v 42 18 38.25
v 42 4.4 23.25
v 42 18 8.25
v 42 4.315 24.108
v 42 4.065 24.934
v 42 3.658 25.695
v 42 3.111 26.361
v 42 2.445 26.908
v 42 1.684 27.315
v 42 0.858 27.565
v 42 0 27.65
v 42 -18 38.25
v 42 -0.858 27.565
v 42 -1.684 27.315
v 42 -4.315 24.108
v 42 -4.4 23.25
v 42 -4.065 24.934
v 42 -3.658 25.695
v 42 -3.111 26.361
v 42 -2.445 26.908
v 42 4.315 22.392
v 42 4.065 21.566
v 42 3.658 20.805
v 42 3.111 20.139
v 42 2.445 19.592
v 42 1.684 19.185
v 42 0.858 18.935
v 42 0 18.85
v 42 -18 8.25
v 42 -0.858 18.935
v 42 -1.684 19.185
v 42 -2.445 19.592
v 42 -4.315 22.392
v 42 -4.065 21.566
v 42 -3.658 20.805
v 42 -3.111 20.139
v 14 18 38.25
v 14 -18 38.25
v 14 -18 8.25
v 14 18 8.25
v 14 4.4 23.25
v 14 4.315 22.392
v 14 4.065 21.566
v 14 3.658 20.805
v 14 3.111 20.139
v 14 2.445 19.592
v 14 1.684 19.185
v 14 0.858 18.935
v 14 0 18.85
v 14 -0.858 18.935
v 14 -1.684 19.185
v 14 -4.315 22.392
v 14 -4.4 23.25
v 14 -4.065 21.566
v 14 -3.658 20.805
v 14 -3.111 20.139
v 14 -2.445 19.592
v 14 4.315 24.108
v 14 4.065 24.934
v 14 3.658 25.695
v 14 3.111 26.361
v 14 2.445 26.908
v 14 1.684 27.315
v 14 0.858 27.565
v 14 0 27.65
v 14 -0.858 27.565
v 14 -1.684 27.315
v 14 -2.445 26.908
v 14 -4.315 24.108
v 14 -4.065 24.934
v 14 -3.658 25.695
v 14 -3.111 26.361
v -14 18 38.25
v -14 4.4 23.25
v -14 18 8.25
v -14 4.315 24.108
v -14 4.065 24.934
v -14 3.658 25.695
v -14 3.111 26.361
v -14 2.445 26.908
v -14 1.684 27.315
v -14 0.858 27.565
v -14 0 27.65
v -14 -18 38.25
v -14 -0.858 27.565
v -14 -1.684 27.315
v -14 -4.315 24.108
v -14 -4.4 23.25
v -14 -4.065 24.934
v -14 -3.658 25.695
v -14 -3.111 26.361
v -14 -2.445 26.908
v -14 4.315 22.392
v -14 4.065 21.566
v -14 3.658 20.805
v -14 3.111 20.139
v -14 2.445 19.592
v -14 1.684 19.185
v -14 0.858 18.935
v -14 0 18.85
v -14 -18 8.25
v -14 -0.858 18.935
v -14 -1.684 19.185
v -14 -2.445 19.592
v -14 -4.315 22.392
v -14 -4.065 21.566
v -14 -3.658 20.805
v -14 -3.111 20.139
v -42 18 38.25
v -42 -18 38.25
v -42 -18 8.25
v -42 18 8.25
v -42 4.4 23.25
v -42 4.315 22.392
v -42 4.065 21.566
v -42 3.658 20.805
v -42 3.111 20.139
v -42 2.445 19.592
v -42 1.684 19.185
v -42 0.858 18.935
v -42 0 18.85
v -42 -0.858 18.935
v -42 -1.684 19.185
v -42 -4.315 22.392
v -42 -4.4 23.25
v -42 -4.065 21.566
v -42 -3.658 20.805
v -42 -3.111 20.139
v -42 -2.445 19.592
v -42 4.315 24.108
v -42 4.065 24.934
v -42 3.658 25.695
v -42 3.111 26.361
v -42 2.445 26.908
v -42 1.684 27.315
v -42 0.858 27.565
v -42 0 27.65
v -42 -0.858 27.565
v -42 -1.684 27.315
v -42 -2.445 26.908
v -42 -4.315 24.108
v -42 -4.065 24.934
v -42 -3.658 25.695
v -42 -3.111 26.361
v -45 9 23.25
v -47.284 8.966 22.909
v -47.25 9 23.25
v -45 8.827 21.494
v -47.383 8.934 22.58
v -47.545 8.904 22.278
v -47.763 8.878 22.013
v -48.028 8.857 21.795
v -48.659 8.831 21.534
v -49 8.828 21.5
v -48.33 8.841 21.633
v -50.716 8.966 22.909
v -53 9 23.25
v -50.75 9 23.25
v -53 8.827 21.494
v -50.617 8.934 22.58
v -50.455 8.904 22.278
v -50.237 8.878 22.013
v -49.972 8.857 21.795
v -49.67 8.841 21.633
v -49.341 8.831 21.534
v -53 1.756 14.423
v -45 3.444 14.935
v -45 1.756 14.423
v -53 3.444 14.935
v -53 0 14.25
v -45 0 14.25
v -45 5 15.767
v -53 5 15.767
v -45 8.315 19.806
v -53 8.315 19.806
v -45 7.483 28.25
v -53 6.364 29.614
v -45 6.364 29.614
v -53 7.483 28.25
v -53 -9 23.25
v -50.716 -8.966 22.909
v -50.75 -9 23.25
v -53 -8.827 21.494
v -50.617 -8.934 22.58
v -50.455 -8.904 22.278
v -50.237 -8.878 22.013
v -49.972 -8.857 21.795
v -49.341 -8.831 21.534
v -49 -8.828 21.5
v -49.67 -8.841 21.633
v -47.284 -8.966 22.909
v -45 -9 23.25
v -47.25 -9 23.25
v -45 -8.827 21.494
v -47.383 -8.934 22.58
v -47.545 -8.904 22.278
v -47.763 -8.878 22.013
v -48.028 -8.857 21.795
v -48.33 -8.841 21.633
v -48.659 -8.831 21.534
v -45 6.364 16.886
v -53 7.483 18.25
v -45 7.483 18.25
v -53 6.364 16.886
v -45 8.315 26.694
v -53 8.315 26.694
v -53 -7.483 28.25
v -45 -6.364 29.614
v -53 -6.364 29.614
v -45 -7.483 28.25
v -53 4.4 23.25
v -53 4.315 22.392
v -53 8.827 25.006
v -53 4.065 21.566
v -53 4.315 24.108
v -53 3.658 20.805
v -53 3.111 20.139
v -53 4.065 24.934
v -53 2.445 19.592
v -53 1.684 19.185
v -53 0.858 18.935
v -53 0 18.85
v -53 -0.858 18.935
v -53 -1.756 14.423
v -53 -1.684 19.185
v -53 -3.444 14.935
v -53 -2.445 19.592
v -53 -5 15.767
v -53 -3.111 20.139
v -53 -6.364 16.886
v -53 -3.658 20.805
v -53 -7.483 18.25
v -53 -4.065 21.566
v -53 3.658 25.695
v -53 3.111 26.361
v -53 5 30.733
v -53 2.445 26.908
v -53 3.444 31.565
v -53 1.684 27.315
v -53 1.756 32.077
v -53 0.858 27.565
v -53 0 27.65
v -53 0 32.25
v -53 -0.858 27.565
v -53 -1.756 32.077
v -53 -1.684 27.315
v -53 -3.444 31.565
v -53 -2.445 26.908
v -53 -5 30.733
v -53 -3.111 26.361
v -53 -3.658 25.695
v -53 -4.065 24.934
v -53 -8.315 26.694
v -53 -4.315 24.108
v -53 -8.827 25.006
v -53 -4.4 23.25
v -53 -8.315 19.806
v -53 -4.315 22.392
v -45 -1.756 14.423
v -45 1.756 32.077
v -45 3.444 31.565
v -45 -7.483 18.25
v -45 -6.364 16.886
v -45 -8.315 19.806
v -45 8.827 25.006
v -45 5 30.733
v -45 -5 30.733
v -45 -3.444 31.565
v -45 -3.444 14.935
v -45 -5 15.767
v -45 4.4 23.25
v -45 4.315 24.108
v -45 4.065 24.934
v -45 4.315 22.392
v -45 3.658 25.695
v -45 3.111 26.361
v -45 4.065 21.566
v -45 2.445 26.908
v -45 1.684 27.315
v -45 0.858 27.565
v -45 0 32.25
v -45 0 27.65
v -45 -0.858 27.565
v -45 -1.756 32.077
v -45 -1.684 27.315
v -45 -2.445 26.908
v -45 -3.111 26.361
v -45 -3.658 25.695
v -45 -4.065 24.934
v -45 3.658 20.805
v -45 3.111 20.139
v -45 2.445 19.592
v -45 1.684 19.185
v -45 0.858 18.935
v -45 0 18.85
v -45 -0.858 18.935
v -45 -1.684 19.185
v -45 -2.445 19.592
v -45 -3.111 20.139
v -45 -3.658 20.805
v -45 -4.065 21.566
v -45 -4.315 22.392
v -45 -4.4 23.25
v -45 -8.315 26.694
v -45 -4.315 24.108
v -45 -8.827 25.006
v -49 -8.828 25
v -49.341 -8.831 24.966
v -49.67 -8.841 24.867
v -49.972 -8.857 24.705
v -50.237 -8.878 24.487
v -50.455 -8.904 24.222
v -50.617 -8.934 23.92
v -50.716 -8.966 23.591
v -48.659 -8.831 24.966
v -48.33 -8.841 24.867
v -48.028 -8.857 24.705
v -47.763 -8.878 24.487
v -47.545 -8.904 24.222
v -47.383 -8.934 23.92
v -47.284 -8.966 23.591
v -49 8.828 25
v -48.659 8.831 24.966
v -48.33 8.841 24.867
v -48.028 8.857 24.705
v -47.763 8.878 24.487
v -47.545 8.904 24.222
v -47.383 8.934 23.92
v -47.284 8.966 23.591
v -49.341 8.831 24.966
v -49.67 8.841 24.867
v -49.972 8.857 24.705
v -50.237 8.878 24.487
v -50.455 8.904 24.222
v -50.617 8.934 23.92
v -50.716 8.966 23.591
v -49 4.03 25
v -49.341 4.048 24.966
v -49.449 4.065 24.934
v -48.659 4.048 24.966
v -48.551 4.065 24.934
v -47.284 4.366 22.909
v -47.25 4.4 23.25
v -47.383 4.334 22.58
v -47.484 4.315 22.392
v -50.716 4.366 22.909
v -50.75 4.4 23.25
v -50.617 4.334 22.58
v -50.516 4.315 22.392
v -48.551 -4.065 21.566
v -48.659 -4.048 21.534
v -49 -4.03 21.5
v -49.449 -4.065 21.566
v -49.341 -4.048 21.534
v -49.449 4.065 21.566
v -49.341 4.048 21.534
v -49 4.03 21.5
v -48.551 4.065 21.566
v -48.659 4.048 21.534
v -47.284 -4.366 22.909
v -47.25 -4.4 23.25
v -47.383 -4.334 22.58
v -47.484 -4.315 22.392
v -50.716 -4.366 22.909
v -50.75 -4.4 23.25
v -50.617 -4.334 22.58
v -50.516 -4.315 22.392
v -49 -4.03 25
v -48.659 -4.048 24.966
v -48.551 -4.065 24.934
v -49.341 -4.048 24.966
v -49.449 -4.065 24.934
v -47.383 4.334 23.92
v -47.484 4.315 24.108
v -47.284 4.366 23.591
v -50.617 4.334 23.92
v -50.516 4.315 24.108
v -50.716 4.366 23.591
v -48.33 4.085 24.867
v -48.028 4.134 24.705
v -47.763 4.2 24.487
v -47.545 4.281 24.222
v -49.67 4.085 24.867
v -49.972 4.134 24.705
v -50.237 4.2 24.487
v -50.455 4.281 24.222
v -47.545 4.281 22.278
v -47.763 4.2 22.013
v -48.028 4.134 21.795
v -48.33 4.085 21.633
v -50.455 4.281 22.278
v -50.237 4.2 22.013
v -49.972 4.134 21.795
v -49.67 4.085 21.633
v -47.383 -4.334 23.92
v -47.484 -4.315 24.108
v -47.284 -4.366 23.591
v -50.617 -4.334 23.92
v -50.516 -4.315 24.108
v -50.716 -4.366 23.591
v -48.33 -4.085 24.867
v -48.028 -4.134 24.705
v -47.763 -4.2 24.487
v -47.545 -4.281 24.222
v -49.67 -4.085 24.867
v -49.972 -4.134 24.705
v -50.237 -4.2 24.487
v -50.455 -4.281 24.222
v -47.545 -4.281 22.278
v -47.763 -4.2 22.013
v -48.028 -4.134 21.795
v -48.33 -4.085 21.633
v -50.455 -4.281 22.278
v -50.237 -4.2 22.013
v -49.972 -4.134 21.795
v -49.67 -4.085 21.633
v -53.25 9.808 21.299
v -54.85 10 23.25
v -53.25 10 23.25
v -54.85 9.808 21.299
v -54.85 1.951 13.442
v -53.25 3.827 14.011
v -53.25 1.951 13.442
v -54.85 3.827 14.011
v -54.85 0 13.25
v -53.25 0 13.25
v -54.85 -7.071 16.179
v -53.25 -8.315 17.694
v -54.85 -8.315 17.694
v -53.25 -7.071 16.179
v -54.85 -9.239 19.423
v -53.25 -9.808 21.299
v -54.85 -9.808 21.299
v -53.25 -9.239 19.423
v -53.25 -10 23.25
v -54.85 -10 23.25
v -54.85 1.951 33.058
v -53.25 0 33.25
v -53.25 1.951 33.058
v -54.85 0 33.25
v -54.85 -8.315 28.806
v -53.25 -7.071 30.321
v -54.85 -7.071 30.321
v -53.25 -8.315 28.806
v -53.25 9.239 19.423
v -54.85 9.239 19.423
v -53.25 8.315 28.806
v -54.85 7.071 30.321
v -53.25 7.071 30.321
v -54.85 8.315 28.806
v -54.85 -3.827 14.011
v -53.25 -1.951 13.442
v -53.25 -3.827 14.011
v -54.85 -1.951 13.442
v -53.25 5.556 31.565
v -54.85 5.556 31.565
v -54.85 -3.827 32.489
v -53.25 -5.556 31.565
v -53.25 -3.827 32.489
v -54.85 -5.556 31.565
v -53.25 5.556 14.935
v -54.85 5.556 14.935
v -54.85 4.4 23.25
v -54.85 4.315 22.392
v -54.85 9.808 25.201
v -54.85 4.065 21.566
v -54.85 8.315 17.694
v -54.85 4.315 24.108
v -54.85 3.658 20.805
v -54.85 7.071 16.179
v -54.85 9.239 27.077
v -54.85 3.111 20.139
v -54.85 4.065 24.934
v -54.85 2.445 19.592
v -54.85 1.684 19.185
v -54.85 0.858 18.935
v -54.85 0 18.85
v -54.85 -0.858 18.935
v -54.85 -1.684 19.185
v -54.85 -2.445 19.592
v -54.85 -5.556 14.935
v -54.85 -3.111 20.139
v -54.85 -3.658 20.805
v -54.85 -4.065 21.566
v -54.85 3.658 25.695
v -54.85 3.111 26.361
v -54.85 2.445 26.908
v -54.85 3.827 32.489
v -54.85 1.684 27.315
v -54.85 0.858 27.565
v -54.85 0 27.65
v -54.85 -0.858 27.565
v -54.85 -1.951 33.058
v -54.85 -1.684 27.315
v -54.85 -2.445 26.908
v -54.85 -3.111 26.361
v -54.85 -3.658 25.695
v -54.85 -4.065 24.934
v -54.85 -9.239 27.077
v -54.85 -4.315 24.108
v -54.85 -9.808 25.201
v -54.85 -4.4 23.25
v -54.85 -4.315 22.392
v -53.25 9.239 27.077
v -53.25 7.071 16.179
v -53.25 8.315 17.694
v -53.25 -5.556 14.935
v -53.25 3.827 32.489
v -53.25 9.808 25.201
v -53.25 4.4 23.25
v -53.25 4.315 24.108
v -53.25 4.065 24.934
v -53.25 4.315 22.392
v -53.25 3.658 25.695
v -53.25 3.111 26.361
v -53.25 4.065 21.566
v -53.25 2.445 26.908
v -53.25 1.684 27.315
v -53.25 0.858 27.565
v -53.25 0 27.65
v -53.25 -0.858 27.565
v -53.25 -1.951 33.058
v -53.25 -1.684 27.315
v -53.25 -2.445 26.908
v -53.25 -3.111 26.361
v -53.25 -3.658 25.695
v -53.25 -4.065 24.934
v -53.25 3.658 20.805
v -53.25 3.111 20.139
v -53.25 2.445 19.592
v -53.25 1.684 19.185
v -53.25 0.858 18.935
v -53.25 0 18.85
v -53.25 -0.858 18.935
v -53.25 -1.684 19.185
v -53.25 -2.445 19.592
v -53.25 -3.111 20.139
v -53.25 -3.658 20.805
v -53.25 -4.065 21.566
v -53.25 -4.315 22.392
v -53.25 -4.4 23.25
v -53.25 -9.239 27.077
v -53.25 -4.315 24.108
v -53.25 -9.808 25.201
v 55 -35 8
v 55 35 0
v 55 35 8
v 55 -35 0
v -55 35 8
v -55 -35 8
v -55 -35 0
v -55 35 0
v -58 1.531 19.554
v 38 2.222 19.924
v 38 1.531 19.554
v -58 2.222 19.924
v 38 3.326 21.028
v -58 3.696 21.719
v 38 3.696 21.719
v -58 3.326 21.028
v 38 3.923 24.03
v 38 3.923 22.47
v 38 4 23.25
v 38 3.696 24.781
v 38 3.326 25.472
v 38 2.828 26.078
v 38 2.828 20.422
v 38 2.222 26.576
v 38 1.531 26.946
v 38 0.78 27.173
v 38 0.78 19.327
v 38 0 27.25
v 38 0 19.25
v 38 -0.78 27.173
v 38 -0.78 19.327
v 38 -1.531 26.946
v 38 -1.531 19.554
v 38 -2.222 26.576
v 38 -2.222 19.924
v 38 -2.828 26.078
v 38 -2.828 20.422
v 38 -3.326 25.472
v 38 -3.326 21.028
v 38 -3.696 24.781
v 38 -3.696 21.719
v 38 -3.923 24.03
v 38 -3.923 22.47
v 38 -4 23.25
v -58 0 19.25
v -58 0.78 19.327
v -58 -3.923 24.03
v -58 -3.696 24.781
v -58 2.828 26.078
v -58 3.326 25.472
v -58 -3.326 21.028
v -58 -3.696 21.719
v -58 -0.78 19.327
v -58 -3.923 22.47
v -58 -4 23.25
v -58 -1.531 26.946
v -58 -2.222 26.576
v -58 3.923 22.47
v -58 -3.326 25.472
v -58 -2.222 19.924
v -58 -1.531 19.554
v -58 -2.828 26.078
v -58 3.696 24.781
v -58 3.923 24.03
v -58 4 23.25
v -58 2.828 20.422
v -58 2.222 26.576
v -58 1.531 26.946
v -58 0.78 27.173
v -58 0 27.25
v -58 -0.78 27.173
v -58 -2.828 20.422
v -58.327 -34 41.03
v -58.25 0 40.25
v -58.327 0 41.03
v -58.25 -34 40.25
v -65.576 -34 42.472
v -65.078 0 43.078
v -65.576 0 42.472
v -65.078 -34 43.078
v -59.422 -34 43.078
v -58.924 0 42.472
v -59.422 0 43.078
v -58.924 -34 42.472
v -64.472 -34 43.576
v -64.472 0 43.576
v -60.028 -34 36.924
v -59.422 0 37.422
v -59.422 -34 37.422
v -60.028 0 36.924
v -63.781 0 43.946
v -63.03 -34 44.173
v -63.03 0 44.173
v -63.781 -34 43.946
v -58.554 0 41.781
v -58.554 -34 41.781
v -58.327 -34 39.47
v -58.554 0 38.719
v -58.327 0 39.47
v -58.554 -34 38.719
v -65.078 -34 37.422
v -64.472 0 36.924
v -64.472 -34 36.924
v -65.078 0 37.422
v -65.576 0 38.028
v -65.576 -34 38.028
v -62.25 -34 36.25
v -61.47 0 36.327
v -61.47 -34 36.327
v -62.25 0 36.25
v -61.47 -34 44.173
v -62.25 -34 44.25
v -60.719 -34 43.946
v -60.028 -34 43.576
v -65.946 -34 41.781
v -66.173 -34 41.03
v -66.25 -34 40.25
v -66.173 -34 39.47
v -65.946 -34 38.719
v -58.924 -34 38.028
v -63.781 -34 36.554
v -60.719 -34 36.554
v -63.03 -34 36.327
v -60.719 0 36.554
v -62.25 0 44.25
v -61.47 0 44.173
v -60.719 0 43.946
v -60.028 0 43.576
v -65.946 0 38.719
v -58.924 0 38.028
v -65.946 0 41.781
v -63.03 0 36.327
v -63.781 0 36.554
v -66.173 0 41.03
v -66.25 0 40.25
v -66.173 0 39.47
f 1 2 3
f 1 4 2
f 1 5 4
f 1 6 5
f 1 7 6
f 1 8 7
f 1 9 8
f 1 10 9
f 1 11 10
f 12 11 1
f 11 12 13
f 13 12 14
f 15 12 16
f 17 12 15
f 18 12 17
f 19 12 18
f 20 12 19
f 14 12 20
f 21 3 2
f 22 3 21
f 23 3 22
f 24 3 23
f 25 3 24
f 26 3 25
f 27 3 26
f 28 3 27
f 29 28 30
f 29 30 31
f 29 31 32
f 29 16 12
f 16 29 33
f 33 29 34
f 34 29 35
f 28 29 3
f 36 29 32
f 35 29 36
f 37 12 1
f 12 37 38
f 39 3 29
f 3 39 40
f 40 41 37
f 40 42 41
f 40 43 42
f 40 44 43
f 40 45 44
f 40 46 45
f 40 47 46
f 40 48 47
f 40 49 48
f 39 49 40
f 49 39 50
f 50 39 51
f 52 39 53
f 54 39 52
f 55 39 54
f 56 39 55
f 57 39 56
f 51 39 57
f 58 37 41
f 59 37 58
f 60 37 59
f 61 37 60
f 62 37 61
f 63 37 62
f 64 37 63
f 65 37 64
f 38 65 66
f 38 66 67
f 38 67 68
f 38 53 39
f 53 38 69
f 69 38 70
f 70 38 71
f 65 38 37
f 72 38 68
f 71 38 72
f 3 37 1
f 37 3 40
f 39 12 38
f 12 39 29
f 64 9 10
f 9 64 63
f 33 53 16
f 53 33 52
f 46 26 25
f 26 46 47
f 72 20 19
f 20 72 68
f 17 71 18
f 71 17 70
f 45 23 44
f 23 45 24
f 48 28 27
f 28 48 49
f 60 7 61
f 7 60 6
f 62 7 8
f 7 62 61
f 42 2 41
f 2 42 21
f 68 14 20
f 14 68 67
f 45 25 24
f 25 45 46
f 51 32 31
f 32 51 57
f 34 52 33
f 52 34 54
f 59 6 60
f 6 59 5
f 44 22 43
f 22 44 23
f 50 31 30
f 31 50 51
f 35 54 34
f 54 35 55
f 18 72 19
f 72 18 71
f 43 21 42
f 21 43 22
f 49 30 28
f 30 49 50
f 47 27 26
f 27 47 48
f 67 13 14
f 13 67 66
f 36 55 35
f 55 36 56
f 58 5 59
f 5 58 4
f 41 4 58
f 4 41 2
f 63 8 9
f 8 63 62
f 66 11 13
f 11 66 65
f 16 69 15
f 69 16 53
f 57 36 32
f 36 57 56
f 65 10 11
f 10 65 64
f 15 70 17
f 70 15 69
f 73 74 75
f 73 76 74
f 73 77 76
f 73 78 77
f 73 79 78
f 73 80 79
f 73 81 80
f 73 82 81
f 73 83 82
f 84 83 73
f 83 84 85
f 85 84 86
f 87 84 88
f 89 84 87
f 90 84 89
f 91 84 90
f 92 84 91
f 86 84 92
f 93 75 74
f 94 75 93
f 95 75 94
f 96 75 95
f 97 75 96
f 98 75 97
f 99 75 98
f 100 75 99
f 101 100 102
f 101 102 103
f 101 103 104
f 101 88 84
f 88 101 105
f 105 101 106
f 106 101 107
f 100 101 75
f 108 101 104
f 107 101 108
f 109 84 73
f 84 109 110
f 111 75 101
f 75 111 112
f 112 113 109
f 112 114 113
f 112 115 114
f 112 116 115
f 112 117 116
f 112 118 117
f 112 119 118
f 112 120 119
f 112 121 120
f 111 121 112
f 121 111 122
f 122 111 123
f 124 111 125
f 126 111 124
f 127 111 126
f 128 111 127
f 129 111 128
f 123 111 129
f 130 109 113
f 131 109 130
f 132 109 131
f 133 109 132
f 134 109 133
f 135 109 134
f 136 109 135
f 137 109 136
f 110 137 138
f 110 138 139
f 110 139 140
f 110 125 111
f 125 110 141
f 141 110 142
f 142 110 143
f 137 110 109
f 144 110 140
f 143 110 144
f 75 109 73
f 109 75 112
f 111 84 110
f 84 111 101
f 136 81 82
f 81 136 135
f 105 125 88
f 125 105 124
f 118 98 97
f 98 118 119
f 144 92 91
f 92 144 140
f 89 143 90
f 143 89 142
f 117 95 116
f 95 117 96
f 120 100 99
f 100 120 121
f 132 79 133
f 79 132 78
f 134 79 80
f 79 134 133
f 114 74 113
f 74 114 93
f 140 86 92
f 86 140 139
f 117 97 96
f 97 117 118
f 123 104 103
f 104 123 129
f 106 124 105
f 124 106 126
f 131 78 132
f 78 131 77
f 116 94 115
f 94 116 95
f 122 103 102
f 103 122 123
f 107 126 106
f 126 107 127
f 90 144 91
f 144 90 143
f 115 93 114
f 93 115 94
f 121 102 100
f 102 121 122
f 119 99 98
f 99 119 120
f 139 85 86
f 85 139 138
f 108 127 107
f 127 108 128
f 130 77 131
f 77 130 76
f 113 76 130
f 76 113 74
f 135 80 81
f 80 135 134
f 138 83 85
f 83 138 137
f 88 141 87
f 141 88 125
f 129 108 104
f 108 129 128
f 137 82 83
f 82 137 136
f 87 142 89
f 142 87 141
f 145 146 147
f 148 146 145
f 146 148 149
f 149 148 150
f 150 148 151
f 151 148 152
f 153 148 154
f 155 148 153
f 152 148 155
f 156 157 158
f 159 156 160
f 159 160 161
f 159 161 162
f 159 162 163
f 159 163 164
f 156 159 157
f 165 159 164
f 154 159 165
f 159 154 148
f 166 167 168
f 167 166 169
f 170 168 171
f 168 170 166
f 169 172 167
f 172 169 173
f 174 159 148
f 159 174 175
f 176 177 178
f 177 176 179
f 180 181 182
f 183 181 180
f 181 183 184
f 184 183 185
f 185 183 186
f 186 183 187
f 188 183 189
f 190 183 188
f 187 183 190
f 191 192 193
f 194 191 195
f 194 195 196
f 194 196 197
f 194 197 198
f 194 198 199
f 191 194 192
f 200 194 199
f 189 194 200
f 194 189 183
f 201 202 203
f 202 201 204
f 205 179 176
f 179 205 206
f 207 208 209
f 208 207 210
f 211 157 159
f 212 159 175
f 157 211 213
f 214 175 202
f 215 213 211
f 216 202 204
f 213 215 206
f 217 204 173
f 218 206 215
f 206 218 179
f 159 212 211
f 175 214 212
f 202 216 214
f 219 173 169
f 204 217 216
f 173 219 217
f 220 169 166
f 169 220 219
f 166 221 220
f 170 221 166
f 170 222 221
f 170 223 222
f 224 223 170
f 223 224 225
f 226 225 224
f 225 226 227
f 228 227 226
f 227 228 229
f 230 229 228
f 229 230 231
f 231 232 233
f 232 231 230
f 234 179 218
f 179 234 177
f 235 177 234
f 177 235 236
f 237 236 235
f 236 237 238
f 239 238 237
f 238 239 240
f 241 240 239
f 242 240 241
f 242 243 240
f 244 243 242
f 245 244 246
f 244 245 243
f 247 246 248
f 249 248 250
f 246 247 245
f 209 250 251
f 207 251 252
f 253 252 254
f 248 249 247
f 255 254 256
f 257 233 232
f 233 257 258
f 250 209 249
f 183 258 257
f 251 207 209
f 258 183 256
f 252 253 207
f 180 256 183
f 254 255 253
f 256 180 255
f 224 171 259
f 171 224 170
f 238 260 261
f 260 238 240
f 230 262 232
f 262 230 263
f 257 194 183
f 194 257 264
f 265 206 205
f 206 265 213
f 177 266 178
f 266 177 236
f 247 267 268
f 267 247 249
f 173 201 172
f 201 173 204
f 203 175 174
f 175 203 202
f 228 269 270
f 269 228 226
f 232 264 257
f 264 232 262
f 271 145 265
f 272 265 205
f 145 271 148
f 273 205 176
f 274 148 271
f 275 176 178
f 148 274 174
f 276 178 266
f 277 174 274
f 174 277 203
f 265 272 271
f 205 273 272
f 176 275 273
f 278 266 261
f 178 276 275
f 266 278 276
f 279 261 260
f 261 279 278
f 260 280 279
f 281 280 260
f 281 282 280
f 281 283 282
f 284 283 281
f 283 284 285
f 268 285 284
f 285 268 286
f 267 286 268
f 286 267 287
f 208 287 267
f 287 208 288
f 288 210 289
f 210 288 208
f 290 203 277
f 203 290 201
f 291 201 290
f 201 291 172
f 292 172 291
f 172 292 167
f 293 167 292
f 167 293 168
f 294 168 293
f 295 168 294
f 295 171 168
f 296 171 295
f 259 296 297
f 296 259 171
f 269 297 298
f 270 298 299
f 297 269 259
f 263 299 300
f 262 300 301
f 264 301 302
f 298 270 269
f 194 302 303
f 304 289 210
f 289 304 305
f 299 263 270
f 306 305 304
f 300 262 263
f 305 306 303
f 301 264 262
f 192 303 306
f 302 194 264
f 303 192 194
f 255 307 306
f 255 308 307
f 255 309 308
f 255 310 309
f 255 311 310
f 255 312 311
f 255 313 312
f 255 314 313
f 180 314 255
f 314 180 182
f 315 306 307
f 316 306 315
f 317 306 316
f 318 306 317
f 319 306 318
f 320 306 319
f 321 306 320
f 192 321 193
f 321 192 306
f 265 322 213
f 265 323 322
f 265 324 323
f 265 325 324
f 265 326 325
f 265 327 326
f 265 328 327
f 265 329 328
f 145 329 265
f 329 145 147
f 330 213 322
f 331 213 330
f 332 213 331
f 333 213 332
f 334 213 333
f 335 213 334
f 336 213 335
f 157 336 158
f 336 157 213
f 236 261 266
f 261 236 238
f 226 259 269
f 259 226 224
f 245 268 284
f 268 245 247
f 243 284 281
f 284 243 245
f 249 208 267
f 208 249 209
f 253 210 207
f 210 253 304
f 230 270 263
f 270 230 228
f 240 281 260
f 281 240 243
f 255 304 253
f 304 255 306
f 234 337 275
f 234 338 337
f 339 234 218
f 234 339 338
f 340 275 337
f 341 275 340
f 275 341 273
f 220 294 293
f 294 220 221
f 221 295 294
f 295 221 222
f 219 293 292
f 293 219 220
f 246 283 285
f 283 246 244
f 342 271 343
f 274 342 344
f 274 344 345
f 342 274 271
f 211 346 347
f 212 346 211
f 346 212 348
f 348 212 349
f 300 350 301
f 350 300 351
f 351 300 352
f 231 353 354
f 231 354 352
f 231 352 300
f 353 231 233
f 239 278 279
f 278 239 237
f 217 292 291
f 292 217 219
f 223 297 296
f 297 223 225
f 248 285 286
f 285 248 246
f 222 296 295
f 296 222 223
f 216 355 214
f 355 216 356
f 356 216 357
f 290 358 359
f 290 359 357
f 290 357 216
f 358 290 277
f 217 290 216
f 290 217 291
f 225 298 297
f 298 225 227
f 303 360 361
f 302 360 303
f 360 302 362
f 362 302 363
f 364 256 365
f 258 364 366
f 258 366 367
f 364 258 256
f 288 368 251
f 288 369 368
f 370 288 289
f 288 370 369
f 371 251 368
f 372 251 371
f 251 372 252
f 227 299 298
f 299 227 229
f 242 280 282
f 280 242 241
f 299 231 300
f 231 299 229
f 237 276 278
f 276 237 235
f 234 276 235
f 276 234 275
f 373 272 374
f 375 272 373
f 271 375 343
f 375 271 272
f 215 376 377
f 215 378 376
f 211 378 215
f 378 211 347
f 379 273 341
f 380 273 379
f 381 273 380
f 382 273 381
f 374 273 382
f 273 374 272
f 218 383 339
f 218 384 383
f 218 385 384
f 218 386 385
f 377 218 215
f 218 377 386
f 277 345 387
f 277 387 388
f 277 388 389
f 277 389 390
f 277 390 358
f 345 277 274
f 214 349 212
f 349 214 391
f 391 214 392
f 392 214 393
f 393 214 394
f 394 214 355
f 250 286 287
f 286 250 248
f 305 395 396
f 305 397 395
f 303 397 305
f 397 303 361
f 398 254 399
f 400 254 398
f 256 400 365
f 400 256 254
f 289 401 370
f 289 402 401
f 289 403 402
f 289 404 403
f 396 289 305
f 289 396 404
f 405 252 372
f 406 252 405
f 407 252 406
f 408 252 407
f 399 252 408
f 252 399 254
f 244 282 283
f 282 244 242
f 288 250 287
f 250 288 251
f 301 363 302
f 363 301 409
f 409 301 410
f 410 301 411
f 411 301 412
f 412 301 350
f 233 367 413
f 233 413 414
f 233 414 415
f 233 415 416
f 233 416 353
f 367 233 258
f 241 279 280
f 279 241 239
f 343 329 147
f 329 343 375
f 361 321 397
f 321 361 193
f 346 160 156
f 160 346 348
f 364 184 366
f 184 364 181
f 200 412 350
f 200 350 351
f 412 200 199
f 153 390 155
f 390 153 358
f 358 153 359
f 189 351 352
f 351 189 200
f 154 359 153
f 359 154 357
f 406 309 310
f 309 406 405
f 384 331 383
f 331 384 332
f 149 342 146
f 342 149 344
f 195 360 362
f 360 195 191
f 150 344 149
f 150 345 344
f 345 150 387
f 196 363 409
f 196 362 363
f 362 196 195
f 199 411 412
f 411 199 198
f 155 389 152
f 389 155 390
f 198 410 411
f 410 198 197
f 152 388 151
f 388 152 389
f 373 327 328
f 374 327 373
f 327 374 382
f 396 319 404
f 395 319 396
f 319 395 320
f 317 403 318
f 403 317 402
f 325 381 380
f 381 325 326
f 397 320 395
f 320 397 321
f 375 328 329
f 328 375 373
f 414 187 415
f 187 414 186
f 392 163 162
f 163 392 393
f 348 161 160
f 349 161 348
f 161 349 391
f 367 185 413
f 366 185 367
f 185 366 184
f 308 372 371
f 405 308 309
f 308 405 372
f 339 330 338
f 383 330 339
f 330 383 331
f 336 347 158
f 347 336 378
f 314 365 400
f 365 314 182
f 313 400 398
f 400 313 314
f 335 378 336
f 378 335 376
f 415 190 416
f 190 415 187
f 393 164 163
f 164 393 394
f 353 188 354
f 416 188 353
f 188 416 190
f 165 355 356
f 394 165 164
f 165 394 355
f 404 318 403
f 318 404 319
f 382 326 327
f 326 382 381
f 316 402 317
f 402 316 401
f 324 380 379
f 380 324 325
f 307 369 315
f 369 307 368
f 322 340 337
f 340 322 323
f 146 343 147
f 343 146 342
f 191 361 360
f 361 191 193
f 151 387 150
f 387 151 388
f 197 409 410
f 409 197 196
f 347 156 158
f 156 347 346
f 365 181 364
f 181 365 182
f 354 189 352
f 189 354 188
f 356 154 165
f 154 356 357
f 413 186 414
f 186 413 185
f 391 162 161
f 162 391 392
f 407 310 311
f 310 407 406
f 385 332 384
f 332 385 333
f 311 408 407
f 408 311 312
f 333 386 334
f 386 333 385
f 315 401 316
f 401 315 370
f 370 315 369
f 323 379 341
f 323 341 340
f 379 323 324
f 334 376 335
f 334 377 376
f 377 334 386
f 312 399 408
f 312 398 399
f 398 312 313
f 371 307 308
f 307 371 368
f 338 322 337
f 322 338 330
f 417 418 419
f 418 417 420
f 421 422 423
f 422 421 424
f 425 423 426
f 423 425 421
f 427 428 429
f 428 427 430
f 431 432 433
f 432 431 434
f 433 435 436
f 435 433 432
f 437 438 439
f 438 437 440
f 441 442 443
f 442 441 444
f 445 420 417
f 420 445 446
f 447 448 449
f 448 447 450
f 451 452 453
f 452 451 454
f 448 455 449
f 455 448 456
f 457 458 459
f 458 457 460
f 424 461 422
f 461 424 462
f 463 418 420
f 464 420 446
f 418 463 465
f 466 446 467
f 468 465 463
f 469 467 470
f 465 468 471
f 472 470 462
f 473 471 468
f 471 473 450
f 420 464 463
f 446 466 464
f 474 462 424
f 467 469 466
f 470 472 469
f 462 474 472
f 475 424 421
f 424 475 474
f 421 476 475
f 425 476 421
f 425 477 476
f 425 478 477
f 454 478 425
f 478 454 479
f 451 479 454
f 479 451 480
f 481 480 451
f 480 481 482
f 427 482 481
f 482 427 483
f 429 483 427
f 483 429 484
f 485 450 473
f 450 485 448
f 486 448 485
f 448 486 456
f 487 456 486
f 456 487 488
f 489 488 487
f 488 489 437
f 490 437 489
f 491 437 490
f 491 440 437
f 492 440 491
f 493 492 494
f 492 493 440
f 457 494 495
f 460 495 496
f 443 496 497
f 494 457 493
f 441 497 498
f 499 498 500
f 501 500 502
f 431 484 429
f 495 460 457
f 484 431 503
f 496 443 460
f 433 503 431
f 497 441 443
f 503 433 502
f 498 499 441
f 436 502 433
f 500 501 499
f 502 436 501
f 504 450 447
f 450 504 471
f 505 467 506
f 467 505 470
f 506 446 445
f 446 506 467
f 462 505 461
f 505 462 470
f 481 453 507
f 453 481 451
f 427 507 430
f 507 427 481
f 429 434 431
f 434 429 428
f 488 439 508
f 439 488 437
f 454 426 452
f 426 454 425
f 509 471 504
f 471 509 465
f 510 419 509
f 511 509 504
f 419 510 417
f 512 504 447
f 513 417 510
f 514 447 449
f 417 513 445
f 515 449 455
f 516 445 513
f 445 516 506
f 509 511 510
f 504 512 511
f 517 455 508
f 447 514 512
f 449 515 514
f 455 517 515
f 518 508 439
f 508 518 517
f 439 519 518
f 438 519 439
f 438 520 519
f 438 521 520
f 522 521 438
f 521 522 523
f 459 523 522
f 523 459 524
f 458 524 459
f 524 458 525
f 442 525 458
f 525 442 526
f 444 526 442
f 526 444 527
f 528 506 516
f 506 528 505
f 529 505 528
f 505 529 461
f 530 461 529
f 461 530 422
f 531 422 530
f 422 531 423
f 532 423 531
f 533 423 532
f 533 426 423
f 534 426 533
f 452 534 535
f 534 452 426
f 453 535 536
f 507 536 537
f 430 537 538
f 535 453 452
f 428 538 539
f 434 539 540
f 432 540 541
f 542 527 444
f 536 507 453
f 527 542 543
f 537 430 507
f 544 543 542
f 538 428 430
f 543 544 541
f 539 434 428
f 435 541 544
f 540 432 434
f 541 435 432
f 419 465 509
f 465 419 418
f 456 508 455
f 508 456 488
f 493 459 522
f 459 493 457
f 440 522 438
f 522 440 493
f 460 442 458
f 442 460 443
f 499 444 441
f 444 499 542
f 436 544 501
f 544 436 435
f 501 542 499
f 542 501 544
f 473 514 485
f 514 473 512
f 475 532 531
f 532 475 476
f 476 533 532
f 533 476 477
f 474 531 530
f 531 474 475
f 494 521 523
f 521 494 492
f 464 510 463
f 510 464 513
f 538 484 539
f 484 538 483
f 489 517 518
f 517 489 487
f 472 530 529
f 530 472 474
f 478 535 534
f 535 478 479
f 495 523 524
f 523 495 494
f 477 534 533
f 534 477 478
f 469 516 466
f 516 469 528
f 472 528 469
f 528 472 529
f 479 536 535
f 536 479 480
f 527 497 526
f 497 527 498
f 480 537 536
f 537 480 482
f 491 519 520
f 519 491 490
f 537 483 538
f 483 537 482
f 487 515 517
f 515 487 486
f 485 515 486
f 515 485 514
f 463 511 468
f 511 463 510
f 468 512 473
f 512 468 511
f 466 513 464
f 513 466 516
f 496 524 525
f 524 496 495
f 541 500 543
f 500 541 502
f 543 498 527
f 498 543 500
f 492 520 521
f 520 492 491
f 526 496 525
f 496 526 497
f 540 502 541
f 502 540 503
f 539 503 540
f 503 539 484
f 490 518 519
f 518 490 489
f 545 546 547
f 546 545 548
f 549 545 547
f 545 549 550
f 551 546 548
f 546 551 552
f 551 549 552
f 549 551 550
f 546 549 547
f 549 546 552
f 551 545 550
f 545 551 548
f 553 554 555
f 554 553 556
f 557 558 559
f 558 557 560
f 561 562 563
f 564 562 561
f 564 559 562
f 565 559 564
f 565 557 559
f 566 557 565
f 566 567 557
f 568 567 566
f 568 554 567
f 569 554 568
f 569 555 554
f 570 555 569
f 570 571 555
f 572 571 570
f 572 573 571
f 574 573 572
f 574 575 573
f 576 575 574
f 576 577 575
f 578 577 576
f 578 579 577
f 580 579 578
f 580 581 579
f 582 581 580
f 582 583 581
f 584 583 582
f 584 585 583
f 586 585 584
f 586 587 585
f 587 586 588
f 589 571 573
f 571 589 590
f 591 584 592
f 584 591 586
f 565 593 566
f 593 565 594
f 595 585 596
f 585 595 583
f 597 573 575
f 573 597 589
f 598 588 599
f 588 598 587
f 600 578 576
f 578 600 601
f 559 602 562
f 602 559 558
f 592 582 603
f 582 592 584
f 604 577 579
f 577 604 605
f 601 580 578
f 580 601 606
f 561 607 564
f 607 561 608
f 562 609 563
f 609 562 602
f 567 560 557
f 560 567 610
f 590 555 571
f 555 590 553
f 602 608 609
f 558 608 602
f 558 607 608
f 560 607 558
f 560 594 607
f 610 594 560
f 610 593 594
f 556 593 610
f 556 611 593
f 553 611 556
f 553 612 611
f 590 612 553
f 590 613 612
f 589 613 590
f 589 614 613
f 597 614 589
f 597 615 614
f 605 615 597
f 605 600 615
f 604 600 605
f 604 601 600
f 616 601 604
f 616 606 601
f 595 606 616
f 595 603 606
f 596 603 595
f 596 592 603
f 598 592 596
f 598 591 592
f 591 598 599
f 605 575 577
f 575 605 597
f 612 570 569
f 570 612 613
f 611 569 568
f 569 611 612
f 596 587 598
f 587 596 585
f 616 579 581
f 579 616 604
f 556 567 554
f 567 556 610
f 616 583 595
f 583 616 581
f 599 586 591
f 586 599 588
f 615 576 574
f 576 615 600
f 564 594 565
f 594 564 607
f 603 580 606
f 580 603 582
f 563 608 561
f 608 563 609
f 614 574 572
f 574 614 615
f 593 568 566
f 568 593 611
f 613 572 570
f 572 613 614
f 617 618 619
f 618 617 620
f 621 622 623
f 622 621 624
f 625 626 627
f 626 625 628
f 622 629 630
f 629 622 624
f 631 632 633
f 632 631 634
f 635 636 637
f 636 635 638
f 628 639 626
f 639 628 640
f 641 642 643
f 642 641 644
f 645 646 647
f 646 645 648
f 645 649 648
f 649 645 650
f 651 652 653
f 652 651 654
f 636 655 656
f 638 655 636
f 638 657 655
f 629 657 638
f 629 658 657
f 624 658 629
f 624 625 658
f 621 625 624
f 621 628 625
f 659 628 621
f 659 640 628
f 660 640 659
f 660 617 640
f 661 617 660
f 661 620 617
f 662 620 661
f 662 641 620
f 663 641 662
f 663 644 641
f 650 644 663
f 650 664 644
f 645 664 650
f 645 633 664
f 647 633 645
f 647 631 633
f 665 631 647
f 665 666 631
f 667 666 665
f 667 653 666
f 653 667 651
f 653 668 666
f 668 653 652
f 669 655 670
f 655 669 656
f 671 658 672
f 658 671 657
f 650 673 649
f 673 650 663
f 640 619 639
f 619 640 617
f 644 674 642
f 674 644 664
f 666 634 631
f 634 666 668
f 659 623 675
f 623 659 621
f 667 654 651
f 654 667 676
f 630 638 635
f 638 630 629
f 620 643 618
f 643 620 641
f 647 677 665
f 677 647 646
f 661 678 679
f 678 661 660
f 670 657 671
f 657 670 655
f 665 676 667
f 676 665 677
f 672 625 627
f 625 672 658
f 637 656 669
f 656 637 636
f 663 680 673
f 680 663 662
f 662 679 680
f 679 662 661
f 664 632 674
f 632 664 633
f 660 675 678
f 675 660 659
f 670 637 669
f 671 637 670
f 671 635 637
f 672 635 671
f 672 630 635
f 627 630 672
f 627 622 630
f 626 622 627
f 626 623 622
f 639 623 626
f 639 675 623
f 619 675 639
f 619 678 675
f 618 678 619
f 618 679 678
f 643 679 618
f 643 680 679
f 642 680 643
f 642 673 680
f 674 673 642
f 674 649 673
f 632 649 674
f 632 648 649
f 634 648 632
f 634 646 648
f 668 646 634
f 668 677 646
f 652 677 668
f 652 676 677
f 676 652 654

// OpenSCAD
$fn = 32;

// ------------------------------------------------------------------------
// Machine vise: screw d8, jaws 28 x 30 mm
// Every part is its own module, assembly() places every instance.
// ------------------------------------------------------------------------

// --- part 1 ---
module vise_bed() {
  difference() {
    translate([-55, -35, 0]) cube([110, 70, 8]);
  }
}

// --- part 2 ---
module vise_jaw() {
  difference() {
    translate([-14, -18, 0]) cube([28, 36, 30]);
    translate([0, 0, 15]) rotate([0, 90, 0]) cylinder(h = 30, d = 8.8, center = true);
  }
}

// --- part 3 ---
module vise_screw() {
  translate([0, 0, -48]) cylinder(h = 96, d = 8);
}

// --- part 4 ---
module screw_collar() {
  difference() {
    cylinder(h = 8, d = 18);
    translate([0, 0, -1]) cylinder(h = 10, d = 8.8);
    translate([0, 0, 4]) rotate([90, 0, 0]) cylinder(h = 20, d = 3.5, center = true);
  }
}

// --- part 5 ---
module screw_washer() {
  difference() {
      translate([0, 0, 0]) cylinder(h = 1.6, d = 20);
      translate([0, 0, -1]) cylinder(h = 3.6, d = 8.8);
    }
}

// --- part 6 ---
module vise_handle() {
  cylinder(h = 34, d = 8);
}

// --- assembly ---
module assembly() {
  color([0.80, 0.24, 0.20]) translate([0, 0, 0]) rotate([0, 0, 0]) vise_bed();
  color([0.20, 0.45, 0.75]) translate([28, 0, 8.25]) rotate([0, 0, 0]) vise_jaw();
  color([0.25, 0.62, 0.32]) translate([-28, 0, 8.25]) rotate([0, 0, 0]) vise_jaw();
  color([0.92, 0.70, 0.18]) translate([-10, 0, 23.25]) rotate([0, 90, 0]) vise_screw();
  color([0.58, 0.35, 0.70]) translate([-53, 0, 23.25]) rotate([0, 90, 0]) screw_collar();
  color([0.16, 0.66, 0.66]) translate([-54.85, 0, 23.25]) rotate([0, 90, 0]) screw_washer();
  color([0.85, 0.48, 0.18]) translate([-62.25, 0, 40.25]) rotate([90, 0, 0]) vise_handle();
}

assembly();
